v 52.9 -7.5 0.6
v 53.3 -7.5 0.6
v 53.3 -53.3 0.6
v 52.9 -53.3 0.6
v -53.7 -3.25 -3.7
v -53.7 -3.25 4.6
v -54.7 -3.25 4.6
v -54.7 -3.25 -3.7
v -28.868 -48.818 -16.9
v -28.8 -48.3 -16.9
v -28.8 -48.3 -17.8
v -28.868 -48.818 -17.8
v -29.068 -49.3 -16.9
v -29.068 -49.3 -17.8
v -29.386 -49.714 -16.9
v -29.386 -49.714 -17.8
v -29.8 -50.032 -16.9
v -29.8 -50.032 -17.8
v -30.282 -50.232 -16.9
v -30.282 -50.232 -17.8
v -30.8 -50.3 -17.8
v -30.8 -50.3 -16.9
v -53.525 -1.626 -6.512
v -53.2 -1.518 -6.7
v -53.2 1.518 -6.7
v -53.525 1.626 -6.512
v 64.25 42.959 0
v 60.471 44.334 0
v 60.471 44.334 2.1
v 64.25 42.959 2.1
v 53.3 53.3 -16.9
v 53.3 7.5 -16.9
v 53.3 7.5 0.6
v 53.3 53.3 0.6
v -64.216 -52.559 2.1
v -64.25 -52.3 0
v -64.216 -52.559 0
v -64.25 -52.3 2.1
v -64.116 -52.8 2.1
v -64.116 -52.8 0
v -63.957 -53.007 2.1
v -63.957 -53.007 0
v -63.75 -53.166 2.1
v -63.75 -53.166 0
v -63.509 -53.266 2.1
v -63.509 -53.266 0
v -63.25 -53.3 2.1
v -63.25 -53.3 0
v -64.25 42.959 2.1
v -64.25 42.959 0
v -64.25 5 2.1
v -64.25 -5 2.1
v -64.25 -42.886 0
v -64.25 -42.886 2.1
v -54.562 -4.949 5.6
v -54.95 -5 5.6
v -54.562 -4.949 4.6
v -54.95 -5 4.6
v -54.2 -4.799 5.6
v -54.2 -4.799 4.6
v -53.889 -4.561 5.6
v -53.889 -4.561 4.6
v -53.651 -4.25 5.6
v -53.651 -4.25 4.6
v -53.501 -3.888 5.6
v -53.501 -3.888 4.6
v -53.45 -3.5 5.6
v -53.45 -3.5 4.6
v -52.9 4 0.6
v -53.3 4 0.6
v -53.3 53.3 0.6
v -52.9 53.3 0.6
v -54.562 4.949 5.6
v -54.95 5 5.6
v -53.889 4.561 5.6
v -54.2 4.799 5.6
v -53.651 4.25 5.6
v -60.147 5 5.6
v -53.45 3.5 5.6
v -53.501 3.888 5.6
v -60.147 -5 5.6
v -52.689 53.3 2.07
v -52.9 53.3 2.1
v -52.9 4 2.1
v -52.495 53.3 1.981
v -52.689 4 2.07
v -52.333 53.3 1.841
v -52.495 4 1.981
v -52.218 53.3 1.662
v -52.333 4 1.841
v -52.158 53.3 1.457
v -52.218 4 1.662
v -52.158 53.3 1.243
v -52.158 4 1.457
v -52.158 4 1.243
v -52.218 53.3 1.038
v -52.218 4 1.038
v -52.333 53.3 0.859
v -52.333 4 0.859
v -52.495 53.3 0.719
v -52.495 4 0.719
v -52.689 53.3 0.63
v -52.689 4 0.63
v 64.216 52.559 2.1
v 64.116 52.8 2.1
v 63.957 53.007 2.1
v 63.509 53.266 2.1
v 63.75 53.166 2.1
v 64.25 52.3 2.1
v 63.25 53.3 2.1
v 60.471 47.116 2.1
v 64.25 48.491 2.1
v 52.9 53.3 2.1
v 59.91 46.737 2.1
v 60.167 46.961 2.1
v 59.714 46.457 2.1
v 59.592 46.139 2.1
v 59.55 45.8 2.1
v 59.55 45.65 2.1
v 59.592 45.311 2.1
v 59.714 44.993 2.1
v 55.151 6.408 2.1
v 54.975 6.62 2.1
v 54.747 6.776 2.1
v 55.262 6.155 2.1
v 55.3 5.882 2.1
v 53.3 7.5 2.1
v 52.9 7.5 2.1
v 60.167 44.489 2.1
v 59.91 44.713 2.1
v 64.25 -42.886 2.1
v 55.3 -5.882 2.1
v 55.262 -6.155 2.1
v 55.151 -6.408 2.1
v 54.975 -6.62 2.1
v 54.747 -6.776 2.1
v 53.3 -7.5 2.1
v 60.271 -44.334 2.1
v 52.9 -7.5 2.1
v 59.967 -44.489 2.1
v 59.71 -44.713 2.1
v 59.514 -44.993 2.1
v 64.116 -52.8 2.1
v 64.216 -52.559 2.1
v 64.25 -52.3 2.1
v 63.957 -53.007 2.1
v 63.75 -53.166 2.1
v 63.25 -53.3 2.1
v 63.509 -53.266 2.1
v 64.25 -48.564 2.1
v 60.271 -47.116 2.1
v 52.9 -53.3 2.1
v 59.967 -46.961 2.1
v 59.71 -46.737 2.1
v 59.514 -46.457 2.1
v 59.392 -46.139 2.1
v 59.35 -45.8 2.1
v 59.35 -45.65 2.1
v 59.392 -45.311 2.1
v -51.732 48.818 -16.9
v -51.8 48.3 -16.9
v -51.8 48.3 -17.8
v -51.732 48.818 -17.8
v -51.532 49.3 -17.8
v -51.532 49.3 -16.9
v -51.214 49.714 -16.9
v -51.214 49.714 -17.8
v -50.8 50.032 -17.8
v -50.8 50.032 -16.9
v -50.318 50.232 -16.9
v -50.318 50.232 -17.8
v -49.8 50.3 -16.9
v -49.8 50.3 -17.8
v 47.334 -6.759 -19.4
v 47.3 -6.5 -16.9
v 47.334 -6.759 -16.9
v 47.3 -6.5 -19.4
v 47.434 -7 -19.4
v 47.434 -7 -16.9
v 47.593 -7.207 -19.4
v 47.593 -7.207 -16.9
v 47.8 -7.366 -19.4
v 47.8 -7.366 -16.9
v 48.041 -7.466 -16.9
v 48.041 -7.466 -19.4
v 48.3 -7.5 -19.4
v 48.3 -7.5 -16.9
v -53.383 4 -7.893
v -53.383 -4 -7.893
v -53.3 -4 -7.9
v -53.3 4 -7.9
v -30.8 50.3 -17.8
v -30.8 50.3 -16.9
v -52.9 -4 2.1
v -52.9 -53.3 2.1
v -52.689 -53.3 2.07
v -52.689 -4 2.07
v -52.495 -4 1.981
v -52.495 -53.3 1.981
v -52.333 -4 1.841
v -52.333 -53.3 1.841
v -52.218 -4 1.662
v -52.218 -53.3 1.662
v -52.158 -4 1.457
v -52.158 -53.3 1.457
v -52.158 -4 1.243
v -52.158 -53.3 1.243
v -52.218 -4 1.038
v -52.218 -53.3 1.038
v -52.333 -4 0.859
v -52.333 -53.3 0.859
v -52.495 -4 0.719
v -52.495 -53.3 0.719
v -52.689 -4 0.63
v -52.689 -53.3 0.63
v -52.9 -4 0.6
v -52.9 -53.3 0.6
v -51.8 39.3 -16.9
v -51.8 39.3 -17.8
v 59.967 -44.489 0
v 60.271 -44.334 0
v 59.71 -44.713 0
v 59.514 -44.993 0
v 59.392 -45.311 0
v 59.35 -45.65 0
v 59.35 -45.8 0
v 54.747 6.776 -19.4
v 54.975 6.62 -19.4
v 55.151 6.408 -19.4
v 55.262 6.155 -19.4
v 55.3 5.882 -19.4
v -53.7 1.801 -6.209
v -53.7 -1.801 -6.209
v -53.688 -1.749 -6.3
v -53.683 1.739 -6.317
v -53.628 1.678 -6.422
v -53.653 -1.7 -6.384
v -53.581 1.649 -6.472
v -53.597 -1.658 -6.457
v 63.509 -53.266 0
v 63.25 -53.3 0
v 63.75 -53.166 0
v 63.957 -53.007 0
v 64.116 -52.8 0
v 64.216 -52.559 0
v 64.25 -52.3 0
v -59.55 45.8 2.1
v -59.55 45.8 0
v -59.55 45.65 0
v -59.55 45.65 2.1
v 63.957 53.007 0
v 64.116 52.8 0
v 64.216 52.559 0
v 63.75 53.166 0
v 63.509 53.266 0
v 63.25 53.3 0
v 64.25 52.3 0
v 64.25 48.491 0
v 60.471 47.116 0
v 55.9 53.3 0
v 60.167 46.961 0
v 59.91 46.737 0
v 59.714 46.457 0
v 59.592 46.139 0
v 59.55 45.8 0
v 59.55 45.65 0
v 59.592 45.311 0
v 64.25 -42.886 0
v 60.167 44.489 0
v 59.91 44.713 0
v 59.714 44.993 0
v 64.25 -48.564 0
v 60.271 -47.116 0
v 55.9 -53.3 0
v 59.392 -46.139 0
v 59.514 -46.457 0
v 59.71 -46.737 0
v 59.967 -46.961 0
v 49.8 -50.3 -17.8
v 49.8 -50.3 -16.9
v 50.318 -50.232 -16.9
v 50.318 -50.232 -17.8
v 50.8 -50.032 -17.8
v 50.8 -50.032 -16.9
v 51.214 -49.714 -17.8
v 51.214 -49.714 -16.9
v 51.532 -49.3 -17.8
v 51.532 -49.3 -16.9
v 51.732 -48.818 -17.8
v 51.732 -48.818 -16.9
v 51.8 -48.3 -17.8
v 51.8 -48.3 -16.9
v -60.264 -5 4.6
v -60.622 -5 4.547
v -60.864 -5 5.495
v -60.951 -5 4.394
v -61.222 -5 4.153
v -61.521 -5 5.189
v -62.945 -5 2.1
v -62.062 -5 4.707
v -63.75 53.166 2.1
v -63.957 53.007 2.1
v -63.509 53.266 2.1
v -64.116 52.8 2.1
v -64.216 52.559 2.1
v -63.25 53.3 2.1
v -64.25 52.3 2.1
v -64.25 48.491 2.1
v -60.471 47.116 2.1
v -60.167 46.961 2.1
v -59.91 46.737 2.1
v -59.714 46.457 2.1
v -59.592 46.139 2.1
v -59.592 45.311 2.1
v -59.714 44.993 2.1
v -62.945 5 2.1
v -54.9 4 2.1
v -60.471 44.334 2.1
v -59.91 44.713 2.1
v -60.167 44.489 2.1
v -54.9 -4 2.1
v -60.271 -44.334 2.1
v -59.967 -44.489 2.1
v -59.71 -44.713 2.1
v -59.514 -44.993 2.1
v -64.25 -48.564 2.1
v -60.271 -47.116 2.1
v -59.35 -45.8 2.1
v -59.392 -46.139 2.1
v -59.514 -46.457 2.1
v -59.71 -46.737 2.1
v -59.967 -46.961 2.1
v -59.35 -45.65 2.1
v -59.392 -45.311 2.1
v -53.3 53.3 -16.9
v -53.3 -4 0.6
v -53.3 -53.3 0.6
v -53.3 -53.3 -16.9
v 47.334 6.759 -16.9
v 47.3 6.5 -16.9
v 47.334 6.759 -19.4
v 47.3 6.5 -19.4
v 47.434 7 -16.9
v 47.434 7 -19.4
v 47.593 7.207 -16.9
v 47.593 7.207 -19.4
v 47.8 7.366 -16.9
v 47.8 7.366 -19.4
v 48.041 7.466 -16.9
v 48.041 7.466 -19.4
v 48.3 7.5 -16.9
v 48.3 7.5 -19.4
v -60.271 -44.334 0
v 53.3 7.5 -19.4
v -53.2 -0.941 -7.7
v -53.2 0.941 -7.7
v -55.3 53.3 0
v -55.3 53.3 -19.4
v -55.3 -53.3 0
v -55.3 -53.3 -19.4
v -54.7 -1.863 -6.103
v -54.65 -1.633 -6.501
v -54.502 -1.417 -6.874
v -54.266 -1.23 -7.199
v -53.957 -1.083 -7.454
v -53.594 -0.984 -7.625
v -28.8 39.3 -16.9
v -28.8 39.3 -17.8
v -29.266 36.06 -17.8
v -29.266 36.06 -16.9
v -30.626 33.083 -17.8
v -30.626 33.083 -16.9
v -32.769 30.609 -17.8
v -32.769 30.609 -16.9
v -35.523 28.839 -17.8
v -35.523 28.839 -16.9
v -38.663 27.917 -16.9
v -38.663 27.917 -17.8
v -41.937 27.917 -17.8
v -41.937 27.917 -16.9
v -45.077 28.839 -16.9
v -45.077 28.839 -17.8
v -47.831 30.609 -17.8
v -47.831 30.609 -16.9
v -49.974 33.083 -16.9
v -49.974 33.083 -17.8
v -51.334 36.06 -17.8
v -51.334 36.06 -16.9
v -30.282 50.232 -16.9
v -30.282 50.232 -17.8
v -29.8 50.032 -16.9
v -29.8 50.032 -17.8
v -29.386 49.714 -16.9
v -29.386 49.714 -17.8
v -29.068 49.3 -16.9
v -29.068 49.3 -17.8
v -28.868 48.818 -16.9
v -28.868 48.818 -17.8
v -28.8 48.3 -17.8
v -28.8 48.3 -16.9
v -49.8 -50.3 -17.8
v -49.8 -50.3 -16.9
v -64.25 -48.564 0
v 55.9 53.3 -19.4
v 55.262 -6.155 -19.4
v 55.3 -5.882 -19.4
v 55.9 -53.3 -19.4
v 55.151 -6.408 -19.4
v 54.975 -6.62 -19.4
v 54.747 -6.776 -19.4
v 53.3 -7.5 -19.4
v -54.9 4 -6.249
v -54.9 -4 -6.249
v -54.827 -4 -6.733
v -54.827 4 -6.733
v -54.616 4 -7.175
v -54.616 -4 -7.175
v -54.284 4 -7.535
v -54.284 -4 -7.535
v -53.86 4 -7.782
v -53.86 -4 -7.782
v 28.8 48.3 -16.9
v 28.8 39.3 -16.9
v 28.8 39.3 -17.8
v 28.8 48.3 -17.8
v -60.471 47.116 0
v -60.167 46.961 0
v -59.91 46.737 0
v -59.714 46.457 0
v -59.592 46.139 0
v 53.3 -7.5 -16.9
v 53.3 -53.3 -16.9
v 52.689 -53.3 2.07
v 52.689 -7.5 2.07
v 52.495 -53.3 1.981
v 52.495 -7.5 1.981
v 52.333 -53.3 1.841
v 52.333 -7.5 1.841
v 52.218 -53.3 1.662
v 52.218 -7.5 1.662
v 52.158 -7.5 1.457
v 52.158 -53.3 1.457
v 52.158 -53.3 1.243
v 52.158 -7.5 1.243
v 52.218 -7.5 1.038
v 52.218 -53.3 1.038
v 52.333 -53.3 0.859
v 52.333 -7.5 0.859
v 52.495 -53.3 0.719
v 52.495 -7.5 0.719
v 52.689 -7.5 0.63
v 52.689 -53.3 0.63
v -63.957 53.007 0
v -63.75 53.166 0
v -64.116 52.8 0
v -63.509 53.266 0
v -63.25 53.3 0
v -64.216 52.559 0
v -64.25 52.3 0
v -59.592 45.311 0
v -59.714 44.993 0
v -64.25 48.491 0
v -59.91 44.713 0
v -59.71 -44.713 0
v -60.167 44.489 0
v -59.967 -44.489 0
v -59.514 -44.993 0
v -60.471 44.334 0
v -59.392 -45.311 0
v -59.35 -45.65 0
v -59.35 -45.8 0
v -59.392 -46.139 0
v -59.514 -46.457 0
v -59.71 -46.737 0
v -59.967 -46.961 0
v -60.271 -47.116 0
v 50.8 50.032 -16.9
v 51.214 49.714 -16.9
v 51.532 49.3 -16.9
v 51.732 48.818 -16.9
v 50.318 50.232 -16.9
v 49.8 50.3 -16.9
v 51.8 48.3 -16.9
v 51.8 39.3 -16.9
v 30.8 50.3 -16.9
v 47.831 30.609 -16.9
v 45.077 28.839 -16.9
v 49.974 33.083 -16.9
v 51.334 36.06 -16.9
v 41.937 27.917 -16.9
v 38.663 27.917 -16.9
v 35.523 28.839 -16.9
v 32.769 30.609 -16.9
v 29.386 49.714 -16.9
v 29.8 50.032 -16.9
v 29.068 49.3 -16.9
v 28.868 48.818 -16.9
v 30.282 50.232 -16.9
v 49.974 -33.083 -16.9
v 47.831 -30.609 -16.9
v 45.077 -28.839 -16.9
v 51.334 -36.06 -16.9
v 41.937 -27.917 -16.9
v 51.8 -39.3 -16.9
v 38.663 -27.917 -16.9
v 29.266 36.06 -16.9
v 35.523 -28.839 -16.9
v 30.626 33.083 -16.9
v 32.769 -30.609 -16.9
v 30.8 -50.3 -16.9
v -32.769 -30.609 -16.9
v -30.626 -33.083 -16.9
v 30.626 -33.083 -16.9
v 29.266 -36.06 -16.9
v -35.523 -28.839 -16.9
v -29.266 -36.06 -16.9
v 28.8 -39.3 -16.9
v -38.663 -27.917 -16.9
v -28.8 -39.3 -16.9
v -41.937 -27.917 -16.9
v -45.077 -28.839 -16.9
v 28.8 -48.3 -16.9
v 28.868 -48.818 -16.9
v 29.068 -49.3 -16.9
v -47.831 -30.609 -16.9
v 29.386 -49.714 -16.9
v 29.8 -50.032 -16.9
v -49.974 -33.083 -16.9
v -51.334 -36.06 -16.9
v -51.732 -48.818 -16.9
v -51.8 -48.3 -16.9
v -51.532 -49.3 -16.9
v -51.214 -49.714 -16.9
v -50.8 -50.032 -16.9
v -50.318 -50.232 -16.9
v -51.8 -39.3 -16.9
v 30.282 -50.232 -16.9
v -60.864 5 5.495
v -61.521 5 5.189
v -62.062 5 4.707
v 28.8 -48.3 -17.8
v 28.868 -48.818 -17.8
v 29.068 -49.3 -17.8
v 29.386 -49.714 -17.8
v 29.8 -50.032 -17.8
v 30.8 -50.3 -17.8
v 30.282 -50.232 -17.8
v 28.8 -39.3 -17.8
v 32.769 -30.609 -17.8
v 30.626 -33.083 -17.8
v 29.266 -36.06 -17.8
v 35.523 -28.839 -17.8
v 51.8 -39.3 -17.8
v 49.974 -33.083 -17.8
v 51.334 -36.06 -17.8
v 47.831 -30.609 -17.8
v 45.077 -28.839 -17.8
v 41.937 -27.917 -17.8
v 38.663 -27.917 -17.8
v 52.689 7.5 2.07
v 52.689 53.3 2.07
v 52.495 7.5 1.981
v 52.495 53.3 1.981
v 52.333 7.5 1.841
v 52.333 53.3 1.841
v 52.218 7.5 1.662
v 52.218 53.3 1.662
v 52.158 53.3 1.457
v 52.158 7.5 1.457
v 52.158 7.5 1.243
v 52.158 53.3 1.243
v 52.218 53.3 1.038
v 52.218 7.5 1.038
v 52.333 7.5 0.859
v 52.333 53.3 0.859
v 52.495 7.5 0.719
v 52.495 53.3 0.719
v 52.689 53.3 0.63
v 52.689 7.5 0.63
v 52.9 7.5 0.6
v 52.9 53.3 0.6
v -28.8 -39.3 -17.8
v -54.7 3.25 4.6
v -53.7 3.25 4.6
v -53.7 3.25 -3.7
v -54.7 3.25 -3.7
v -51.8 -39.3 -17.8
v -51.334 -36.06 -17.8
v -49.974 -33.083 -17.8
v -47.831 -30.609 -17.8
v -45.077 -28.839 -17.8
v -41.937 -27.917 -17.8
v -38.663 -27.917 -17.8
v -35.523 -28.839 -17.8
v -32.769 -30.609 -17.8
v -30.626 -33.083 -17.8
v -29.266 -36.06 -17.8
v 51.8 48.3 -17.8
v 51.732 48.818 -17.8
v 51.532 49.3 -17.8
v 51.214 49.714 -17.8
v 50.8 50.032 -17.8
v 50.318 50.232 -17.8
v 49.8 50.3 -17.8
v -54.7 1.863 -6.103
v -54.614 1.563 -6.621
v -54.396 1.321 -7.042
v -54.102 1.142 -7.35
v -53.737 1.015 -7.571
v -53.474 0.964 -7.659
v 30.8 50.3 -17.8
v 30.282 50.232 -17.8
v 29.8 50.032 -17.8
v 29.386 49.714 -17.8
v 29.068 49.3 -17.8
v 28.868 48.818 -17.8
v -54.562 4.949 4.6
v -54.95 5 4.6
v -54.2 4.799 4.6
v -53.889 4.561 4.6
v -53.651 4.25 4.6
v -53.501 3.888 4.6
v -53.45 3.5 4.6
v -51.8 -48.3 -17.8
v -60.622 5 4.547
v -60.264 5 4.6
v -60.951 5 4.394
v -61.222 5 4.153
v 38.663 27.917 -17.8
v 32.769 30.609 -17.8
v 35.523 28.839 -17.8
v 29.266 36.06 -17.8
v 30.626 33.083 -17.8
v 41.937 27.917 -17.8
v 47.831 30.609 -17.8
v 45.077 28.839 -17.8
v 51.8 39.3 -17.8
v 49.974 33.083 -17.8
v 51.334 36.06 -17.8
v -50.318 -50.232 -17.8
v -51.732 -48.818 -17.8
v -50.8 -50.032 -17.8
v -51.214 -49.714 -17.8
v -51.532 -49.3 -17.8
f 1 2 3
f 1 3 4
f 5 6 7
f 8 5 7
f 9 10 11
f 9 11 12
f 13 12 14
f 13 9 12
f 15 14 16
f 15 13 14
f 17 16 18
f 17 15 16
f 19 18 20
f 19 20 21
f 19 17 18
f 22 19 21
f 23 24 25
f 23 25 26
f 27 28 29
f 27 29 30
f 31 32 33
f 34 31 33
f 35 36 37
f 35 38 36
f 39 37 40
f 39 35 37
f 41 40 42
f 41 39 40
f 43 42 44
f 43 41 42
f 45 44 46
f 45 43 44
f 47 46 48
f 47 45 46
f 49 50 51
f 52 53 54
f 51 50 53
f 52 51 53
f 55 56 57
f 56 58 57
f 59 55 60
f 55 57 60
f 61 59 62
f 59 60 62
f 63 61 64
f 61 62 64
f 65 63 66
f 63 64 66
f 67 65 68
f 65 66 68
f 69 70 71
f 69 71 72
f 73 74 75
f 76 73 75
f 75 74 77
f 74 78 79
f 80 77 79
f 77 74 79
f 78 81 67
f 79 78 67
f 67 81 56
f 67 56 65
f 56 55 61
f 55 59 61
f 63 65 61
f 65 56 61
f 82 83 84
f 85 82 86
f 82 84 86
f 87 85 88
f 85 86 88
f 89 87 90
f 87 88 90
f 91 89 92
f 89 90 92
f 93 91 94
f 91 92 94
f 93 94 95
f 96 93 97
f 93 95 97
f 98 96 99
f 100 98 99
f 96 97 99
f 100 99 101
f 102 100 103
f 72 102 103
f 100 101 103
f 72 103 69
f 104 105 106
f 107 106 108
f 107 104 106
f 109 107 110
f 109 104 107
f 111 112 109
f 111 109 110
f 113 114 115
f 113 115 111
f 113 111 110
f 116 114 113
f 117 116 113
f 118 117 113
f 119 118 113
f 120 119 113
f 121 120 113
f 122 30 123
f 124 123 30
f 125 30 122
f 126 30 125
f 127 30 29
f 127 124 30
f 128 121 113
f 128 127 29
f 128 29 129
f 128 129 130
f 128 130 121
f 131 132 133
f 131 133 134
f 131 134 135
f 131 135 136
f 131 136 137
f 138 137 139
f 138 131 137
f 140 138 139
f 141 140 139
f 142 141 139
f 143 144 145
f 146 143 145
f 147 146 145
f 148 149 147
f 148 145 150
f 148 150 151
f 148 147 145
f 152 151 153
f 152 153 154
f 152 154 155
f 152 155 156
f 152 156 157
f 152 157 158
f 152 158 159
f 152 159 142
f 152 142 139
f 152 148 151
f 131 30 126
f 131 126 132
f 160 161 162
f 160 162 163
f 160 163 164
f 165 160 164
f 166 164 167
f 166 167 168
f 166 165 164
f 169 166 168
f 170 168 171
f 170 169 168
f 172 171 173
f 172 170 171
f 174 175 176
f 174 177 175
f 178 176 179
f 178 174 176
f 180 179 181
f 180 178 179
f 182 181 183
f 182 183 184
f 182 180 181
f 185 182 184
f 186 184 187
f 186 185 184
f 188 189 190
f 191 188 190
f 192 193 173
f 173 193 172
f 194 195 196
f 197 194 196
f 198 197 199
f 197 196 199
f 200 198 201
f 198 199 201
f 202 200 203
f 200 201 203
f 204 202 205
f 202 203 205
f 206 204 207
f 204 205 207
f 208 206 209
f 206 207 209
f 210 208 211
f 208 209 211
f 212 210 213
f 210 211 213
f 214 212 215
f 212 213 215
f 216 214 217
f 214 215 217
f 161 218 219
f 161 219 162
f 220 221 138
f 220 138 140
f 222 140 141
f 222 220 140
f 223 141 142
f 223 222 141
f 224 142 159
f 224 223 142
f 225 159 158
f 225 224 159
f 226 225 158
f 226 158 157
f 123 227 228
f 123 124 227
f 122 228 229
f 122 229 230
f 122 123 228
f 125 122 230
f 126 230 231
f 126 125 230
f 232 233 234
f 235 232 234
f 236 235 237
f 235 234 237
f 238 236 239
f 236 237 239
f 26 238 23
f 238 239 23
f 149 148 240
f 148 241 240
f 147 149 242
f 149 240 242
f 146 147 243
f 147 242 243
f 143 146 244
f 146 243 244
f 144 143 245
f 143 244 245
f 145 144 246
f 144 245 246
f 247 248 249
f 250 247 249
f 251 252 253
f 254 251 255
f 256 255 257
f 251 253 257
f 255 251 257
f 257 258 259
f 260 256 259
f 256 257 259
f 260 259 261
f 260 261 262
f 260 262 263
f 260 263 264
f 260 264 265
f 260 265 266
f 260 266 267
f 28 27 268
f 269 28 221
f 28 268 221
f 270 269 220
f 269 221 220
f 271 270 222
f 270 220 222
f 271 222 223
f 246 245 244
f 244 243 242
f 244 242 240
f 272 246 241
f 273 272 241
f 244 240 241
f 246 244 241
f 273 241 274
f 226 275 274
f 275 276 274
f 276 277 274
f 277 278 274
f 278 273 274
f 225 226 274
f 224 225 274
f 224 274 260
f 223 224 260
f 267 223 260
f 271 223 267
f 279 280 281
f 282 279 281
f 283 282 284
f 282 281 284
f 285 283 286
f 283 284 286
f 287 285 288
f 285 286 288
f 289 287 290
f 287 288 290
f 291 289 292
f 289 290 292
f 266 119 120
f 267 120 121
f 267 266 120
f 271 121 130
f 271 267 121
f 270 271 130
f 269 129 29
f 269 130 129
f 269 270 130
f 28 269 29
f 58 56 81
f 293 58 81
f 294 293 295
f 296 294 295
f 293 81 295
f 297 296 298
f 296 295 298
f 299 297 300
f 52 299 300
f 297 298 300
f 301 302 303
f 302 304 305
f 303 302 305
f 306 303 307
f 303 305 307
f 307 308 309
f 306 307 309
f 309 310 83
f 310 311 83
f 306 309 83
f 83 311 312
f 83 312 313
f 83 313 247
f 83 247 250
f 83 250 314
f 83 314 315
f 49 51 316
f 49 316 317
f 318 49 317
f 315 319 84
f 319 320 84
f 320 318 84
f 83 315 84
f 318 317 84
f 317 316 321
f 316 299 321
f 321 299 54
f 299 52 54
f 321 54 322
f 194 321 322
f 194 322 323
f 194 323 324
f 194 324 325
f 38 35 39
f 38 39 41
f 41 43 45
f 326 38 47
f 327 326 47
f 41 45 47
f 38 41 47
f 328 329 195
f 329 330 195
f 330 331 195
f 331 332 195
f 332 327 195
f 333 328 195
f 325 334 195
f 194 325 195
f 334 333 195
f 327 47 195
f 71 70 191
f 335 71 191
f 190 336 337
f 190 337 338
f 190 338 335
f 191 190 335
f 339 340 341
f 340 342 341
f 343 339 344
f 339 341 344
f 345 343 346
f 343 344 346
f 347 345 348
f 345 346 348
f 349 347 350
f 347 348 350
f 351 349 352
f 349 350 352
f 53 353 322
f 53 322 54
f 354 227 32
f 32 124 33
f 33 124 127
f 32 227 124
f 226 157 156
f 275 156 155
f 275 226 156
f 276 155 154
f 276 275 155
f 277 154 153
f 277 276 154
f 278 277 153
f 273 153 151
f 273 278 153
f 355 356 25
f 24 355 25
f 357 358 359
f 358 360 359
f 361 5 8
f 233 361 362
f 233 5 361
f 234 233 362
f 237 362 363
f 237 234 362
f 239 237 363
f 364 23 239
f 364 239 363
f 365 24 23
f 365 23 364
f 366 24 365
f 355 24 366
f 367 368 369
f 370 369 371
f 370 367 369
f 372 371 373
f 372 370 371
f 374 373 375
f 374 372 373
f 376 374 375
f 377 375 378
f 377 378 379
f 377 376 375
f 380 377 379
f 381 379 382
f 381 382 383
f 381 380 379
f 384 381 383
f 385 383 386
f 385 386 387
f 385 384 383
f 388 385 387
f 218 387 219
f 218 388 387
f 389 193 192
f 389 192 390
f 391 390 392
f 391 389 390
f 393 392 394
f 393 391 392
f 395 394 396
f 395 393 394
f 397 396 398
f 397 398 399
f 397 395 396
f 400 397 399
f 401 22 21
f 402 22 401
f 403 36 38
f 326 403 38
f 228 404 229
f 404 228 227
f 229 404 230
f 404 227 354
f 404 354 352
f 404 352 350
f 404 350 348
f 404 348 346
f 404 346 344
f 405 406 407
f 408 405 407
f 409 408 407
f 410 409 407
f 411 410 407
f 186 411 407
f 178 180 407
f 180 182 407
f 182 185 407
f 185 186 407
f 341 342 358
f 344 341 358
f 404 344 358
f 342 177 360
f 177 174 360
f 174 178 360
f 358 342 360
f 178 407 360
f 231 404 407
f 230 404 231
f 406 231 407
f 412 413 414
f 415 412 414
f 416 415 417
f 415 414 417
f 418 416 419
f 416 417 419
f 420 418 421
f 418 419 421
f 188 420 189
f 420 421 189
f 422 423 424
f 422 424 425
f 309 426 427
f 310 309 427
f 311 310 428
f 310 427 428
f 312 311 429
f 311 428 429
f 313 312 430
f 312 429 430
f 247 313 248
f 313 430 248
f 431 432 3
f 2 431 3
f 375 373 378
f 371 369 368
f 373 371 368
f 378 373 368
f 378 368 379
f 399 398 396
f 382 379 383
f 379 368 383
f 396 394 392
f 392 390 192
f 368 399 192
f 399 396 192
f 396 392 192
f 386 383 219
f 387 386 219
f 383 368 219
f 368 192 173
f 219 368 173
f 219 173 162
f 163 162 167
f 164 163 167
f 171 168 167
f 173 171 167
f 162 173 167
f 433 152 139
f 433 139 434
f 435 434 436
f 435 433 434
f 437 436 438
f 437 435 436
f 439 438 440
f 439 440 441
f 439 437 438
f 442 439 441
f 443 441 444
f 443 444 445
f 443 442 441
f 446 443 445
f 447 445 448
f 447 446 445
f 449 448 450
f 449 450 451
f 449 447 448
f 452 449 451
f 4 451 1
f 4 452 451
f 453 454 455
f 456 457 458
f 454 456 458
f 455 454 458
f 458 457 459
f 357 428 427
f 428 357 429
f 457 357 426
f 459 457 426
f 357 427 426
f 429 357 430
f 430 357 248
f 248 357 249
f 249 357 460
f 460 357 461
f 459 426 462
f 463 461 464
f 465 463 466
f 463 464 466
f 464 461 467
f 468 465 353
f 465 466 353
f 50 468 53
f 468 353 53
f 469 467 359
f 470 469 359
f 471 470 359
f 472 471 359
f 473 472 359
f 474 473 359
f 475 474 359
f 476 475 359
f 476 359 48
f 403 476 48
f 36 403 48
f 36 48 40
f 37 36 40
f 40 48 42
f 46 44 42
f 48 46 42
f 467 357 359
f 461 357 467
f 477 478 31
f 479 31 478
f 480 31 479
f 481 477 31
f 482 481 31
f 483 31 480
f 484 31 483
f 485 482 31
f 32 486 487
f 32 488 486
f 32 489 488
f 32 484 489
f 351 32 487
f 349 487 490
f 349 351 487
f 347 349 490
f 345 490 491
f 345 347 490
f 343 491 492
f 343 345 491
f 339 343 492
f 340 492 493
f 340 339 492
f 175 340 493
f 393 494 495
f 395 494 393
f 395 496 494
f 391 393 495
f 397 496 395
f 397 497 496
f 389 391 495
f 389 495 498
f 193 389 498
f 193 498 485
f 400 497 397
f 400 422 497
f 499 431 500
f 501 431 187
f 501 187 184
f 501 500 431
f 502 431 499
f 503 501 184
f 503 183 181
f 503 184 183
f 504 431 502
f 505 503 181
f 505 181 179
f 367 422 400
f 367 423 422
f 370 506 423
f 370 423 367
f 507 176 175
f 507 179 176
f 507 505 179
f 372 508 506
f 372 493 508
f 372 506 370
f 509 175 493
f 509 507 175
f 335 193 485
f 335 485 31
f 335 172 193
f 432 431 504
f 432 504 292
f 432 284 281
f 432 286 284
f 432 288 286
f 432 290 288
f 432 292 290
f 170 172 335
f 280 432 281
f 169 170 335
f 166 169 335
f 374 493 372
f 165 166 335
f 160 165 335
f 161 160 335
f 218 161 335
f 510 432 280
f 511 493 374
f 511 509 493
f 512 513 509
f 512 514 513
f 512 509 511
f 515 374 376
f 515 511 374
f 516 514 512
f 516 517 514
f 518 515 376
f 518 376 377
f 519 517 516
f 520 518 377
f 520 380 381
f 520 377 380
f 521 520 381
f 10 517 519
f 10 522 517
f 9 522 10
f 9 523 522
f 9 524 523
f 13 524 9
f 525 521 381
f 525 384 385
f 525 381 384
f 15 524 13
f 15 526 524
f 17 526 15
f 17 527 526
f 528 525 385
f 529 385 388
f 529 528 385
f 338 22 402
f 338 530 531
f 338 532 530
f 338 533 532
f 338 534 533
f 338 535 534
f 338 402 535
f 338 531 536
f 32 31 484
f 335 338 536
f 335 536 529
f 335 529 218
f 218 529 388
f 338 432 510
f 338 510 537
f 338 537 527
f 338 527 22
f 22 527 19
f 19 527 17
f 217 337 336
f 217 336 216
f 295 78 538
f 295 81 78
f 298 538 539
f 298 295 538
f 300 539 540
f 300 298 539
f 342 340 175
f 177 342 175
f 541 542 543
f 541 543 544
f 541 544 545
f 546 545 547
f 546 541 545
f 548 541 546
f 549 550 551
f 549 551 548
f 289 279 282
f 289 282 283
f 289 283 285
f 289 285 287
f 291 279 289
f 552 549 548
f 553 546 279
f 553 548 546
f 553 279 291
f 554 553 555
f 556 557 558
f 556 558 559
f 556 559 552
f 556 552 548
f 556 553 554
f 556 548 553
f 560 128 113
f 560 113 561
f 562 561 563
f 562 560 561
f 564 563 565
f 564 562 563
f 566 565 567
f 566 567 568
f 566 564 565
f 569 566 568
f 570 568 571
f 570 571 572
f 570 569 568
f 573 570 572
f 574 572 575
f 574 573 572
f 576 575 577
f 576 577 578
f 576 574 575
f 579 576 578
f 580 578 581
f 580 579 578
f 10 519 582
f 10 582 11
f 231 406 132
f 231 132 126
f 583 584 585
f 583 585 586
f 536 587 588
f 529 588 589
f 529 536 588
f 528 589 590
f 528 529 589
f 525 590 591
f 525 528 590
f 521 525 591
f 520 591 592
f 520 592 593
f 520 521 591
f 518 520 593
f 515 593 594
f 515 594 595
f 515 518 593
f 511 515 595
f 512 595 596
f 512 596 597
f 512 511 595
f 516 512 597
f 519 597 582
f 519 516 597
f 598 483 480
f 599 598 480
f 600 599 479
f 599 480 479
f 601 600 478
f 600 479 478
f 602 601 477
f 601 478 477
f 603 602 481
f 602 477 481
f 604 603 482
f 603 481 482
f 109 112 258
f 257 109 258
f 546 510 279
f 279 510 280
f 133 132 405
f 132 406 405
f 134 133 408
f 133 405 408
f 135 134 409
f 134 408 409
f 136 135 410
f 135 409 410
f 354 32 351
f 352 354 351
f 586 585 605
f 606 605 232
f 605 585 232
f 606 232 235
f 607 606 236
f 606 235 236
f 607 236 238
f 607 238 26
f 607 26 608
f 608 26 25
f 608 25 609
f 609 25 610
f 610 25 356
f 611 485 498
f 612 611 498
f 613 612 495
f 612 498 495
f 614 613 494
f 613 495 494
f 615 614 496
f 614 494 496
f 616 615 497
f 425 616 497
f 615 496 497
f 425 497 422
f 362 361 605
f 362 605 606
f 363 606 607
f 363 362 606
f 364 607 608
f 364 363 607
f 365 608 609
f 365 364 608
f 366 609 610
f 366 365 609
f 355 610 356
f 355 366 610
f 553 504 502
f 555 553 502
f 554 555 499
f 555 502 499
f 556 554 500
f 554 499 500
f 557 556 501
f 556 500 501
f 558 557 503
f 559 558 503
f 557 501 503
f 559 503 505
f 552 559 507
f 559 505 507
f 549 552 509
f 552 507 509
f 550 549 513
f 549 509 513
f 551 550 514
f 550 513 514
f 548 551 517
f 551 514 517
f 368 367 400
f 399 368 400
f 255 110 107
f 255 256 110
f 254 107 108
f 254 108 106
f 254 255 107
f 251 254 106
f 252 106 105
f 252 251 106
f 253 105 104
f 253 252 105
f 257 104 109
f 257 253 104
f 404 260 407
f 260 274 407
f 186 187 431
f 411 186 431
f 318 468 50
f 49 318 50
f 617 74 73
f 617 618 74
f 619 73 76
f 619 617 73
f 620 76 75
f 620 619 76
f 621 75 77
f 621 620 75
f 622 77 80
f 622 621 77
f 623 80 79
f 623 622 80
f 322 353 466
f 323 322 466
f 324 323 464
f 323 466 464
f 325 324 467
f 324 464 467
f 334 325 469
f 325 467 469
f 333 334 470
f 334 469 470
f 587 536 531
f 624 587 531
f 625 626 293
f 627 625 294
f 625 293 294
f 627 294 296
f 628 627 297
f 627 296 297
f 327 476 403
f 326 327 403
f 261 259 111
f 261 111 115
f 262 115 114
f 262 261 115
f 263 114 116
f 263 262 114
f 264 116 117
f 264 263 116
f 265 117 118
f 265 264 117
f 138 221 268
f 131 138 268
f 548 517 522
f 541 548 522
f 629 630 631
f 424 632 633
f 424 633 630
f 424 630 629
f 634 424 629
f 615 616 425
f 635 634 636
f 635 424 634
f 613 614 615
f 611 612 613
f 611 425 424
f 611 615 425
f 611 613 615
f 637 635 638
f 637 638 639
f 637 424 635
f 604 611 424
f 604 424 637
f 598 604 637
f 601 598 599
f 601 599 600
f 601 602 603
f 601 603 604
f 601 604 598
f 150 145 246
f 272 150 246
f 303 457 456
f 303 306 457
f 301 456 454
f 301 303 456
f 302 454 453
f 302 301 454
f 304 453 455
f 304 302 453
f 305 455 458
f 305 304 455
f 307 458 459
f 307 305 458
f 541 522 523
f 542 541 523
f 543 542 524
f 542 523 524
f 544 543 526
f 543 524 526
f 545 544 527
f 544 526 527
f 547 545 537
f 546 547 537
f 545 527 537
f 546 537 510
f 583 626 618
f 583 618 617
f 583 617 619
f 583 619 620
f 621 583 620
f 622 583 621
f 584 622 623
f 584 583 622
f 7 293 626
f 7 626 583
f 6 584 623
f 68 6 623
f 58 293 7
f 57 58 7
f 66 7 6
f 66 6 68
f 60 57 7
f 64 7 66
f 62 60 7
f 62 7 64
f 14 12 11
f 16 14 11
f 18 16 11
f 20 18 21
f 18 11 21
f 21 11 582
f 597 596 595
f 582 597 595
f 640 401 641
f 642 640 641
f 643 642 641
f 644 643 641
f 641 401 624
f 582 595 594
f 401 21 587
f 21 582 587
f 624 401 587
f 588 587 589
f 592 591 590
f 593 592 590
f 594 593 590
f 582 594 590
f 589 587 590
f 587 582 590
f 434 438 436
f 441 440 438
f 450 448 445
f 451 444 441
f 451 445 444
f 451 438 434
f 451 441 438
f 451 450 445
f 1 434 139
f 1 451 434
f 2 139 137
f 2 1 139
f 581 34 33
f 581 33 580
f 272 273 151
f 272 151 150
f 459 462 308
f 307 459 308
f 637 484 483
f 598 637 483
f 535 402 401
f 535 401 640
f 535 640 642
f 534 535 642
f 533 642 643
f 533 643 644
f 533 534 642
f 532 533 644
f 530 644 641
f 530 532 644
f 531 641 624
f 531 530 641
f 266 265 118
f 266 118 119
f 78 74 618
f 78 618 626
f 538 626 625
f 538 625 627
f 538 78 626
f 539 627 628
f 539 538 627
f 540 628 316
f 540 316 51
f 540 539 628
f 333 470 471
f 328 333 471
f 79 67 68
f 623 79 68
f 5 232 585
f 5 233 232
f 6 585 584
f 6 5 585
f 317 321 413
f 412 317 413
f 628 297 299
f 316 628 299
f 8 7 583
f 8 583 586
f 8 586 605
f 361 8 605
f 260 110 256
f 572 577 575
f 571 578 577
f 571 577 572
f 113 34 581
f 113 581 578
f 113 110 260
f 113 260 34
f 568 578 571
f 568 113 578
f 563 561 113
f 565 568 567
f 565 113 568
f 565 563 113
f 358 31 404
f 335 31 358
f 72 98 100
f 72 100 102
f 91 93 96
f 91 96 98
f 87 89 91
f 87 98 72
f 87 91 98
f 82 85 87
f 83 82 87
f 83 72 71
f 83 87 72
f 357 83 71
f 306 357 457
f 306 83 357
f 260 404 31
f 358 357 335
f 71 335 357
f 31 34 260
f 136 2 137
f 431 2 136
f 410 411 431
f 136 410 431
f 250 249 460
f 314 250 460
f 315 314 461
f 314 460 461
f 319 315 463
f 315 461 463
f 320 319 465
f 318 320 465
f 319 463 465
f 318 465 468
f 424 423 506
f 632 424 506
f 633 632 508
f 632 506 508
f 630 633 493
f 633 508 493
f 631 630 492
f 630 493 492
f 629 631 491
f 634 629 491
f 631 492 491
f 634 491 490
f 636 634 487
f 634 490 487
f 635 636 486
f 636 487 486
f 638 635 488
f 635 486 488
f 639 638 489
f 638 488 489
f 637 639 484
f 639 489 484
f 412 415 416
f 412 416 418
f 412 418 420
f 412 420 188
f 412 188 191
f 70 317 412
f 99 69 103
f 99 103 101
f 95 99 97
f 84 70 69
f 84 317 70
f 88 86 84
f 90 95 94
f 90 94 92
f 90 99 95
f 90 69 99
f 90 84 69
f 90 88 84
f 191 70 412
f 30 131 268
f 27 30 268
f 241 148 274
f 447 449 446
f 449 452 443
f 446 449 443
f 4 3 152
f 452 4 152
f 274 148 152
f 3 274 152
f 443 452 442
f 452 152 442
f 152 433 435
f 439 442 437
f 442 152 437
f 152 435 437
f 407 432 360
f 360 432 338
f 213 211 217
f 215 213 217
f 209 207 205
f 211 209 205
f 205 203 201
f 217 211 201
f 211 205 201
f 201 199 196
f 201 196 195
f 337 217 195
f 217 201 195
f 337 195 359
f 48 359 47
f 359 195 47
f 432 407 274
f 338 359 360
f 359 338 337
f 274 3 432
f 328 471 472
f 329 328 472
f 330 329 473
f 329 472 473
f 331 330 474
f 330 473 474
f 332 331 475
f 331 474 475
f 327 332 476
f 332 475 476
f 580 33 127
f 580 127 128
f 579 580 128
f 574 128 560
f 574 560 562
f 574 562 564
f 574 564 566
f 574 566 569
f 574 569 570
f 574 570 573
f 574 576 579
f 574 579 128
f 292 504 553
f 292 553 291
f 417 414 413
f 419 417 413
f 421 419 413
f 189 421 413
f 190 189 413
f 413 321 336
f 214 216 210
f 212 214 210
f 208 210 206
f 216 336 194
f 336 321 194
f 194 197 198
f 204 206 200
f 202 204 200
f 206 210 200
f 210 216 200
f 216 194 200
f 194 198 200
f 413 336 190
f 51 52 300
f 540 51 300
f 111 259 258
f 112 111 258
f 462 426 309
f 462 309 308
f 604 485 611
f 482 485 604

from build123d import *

# Parameters (mm, degrees)
PAD003_DEPTH         = 5
PAD_DEPTH            = 3.25
POCKET012_DEPTH      = 54.7
FILLET_R             = 1.5
PAD001_DEPTH         = 53.3
PAD002_DEPTH         = 53.3
POCKET_DEPTH         = 17.8
POCKET001_DEPTH      = 5
POCKET005_DEPTH      = 19.401
POCKET005_DEPTH_BACK = -2.101
POCKET011_DEPTH      = 4
FILLET001_R          = 1
FILLET002_R          = 1


with BuildPart() as body:
    # Sketch025 → Pad003 (new body, symmetric)
    with BuildSketch(Plane.XZ):
        with BuildLine():
            Line((-64.25, 2.1), (-62.062493, 4.706969))
            ThreePointArc((-60.147382, 5.6), (-61.203928, 5.365769), (-62.062493, 4.706969))
            Line((-60.147382, 5.6), (-53.45, 5.6))
            Line((-53.45, 5.6), (-53.45, 4.6))
            Line((-53.45, 4.6), (-53.7, 4.6))
            Line((-54.7, 4.6), (-53.7, 4.6))
            Line((-54.7, 4.6), (-60.263959, 4.6))
            ThreePointArc((-60.263959, 4.6), (-60.792232, 4.482885), (-61.221515, 4.153485))
            Line((-61.221515, 4.153485), (-62.944593, 2.1))
            Line((-64.25, 2.1), (-62.944593, 2.1))
        make_face()
    extrude(amount=PAD003_DEPTH, both=True)

    # Sketch028 → Pad (join, symmetric)
    with BuildSketch(Plane.XZ):
        with BuildLine():
            Line((-53.7, 3.1), (-53.7, -6.209252))
            ThreePointArc((-53.7, -6.209252), (-53.653109, -6.384252), (-53.525, -6.512361))
            Line((-53.2, -6.7), (-53.525, -6.512361))
            Line((-53.2, -7.7), (-53.2, -6.7))
            ThreePointArc((-54.7, -6.103128), (-54.26619, -7.198573), (-53.2, -7.7))
            Line((-54.7, 3.1), (-54.7, -6.103128))
            Line((-54.7, 3.1), (-54.7, 4.6))
            Line((-54.7, 4.6), (-53.7, 4.6))
            Line((-53.7, 3.1), (-53.7, 4.6))
        make_face()
    extrude(amount=PAD_DEPTH, both=True)

    # Sketch027 → Pocket012 (cut)
    with BuildSketch(Plane.YZ):
        Polygon((3.25, -3.7), (0.940599, -7.7), (3.25, -7.7), align=None)
    pocket012 = extrude(amount=-POCKET012_DEPTH, mode=Mode.SUBTRACT)

    # Mirrored001: Pocket012 across Sketch027 V_Axis
    add(pocket012.mirror(Plane(origin=(0, 0, 0), x_dir=(1, 0, 0), z_dir=(0, 1, 0))), mode=Mode.SUBTRACT)

    # Fillet
    fillet_edges = [body.edges().sort_by_distance(p)[0] for p in [
        (-53.45, -5, 5.1),
        (-53.45, 5, 5.1),
    ]]
    fillet(fillet_edges, radius=FILLET_R)


with BuildPart() as eurorack_case:
    # Sketch001 → Pad001 (new body, symmetric)
    with BuildSketch(Plane.XZ):
        Polygon((64.25, 0), (55.9, 0), (55.9, -19.4), (-55.3, -19.4), (-55.3, 0), (-64.25, 0), (-64.25, 2.1), (-53.3, 2.1), (-53.3, -16.9), (0, -16.9), (53.3, -16.9), (53.3, 2.1), (64.25, 2.1), align=None)
    extrude(amount=PAD001_DEPTH, both=True)

    # Sketch002 → Pad002 (join, symmetric)
    with BuildSketch(Plane.XZ):
        with BuildLine():
            ThreePointArc((52.9, 2.1), (52.15, 1.35), (52.9, 0.6))
            Line((53.3, 0.6), (52.9, 0.6))
            Line((53.3, 2.1), (53.3, 0.6))
            Line((53.3, 2.1), (52.9, 2.1))
        make_face()
    pad002 = extrude(amount=PAD002_DEPTH, both=True)

    # Sketch003 → Pocket (cut)
    with BuildSketch(Plane.XY):
        with BuildLine():
            ThreePointArc((28.8, 39.3), (40.3, 27.8), (51.8, 39.3))
            Line((51.8, 39.3), (51.8, 48.3))
            ThreePointArc((51.8, 48.3), (51.214214, 49.714214), (49.8, 50.3))
            Line((30.8, 50.3), (49.8, 50.3))
            ThreePointArc((30.8, 50.3), (29.385786, 49.714214), (28.8, 48.3))
            Line((28.8, 39.3), (28.8, 48.3))
        make_face()
        with BuildLine():
            ThreePointArc((51.8, -39.3), (40.3, -27.8), (28.8, -39.3))
            Line((28.8, -39.3), (28.8, -48.3))
            ThreePointArc((28.8, -48.3), (29.385786, -49.714214), (30.8, -50.3))
            Line((30.8, -50.3), (49.8, -50.3))
            ThreePointArc((49.8, -50.3), (51.214214, -49.714214), (51.8, -48.3))
            Line((51.8, -39.3), (51.8, -48.3))
        make_face()
    pocket = extrude(amount=-POCKET_DEPTH, mode=Mode.SUBTRACT)

    # Sketch004 → Pocket001 (cut)
    with BuildSketch(Plane.XY):
        with BuildLine():
            ThreePointArc((59.35, -45.8), (59.603187, -46.603007), (60.271172, -47.11557))
            Line((60.271172, -47.11557), (64.25, -48.563745))
            Line((64.25, -42.886255), (64.25, -48.563745))
            Line((60.271172, -44.33443), (64.25, -42.886255))
            ThreePointArc((60.271172, -44.33443), (59.603187, -44.846993), (59.35, -45.65))
            Line((59.35, -45.65), (59.35, -45.8))
        make_face()
        with BuildLine():
            ThreePointArc((60.471172, 47.11557), (59.803187, 46.603007), (59.55, 45.8))
            Line((59.55, 45.8), (59.55, 45.65))
            ThreePointArc((59.55, 45.65), (59.803187, 44.846993), (60.471172, 44.33443))
            Line((60.471172, 44.33443), (64.25, 42.959049))
            Line((64.25, 48.490951), (64.25, 42.959049))
            Line((60.471172, 47.11557), (64.25, 48.490951))
        make_face()
    pocket001 = extrude(amount=POCKET001_DEPTH, mode=Mode.SUBTRACT)

    # Mirrored: Pad002, Pocket, Pocket001 across Sketch002 V_Axis
    add(pad002.mirror(Plane(origin=(0, 0, 0), x_dir=(0, -1, 0), z_dir=(1, 0, 0))))
    add(pocket.mirror(Plane(origin=(0, 0, 0), x_dir=(0, -1, 0), z_dir=(1, 0, 0))), mode=Mode.SUBTRACT)
    add(pocket001.mirror(Plane(origin=(0, 0, 0), x_dir=(0, -1, 0), z_dir=(1, 0, 0))), mode=Mode.SUBTRACT)

    # Sketch011 → Pocket005 (cut, two sides)
    with BuildSketch(Plane.XY) as pocket005_sk:
        Polygon((47.3, 7.5), (47.3, -7.5), (53.3, -7.5), (55.3, -6.5), (55.3, 6.5), (53.3, 7.5), align=None)
    extrude(amount=-POCKET005_DEPTH, mode=Mode.SUBTRACT)
    extrude(pocket005_sk.sketch, amount=-POCKET005_DEPTH_BACK, mode=Mode.SUBTRACT)

    # Sketch024 → Pocket011 (cut, symmetric)
    with BuildSketch(Plane.XZ):
        with BuildLine():
            Line((-54.9, 3), (-54.9, -6.248633))
            ThreePointArc((-54.9, -6.248633), (-54.463, -7.367173), (-53.383476, -7.893225))
            Line((-53.383476, -7.893225), (-53.3, -7.9))
            Line((-51.9, 3), (-53.3, -7.9))
            Line((-54.9, 3), (-51.9, 3))
        make_face()
    extrude(amount=POCKET011_DEPTH, both=True, mode=Mode.SUBTRACT)

    # Boolean: union Body
    add(body.part)

    # Fillet001
    fillet001_edges = [eurorack_case.edges().sort_by_distance(p)[0] for p in [
        (-64.25, -53.3, 1.05),
        (64.25, -53.3, 1.05),
        (64.25, 53.3, 1.05),
        (-64.25, 53.3, 1.05),
    ]]
    fillet(fillet001_edges, radius=FILLET001_R)

    # Fillet002
    fillet002_edges = [eurorack_case.edges().sort_by_distance(p)[0] for p in [
        (55.3, 6.5, -8.65),
        (55.3, -6.5, -8.65),
        (47.3, 7.5, -18.15),
        (47.3, -7.5, -18.15),
    ]]
    fillet(fillet002_edges, radius=FILLET002_R)


solid = eurorack_case.part
